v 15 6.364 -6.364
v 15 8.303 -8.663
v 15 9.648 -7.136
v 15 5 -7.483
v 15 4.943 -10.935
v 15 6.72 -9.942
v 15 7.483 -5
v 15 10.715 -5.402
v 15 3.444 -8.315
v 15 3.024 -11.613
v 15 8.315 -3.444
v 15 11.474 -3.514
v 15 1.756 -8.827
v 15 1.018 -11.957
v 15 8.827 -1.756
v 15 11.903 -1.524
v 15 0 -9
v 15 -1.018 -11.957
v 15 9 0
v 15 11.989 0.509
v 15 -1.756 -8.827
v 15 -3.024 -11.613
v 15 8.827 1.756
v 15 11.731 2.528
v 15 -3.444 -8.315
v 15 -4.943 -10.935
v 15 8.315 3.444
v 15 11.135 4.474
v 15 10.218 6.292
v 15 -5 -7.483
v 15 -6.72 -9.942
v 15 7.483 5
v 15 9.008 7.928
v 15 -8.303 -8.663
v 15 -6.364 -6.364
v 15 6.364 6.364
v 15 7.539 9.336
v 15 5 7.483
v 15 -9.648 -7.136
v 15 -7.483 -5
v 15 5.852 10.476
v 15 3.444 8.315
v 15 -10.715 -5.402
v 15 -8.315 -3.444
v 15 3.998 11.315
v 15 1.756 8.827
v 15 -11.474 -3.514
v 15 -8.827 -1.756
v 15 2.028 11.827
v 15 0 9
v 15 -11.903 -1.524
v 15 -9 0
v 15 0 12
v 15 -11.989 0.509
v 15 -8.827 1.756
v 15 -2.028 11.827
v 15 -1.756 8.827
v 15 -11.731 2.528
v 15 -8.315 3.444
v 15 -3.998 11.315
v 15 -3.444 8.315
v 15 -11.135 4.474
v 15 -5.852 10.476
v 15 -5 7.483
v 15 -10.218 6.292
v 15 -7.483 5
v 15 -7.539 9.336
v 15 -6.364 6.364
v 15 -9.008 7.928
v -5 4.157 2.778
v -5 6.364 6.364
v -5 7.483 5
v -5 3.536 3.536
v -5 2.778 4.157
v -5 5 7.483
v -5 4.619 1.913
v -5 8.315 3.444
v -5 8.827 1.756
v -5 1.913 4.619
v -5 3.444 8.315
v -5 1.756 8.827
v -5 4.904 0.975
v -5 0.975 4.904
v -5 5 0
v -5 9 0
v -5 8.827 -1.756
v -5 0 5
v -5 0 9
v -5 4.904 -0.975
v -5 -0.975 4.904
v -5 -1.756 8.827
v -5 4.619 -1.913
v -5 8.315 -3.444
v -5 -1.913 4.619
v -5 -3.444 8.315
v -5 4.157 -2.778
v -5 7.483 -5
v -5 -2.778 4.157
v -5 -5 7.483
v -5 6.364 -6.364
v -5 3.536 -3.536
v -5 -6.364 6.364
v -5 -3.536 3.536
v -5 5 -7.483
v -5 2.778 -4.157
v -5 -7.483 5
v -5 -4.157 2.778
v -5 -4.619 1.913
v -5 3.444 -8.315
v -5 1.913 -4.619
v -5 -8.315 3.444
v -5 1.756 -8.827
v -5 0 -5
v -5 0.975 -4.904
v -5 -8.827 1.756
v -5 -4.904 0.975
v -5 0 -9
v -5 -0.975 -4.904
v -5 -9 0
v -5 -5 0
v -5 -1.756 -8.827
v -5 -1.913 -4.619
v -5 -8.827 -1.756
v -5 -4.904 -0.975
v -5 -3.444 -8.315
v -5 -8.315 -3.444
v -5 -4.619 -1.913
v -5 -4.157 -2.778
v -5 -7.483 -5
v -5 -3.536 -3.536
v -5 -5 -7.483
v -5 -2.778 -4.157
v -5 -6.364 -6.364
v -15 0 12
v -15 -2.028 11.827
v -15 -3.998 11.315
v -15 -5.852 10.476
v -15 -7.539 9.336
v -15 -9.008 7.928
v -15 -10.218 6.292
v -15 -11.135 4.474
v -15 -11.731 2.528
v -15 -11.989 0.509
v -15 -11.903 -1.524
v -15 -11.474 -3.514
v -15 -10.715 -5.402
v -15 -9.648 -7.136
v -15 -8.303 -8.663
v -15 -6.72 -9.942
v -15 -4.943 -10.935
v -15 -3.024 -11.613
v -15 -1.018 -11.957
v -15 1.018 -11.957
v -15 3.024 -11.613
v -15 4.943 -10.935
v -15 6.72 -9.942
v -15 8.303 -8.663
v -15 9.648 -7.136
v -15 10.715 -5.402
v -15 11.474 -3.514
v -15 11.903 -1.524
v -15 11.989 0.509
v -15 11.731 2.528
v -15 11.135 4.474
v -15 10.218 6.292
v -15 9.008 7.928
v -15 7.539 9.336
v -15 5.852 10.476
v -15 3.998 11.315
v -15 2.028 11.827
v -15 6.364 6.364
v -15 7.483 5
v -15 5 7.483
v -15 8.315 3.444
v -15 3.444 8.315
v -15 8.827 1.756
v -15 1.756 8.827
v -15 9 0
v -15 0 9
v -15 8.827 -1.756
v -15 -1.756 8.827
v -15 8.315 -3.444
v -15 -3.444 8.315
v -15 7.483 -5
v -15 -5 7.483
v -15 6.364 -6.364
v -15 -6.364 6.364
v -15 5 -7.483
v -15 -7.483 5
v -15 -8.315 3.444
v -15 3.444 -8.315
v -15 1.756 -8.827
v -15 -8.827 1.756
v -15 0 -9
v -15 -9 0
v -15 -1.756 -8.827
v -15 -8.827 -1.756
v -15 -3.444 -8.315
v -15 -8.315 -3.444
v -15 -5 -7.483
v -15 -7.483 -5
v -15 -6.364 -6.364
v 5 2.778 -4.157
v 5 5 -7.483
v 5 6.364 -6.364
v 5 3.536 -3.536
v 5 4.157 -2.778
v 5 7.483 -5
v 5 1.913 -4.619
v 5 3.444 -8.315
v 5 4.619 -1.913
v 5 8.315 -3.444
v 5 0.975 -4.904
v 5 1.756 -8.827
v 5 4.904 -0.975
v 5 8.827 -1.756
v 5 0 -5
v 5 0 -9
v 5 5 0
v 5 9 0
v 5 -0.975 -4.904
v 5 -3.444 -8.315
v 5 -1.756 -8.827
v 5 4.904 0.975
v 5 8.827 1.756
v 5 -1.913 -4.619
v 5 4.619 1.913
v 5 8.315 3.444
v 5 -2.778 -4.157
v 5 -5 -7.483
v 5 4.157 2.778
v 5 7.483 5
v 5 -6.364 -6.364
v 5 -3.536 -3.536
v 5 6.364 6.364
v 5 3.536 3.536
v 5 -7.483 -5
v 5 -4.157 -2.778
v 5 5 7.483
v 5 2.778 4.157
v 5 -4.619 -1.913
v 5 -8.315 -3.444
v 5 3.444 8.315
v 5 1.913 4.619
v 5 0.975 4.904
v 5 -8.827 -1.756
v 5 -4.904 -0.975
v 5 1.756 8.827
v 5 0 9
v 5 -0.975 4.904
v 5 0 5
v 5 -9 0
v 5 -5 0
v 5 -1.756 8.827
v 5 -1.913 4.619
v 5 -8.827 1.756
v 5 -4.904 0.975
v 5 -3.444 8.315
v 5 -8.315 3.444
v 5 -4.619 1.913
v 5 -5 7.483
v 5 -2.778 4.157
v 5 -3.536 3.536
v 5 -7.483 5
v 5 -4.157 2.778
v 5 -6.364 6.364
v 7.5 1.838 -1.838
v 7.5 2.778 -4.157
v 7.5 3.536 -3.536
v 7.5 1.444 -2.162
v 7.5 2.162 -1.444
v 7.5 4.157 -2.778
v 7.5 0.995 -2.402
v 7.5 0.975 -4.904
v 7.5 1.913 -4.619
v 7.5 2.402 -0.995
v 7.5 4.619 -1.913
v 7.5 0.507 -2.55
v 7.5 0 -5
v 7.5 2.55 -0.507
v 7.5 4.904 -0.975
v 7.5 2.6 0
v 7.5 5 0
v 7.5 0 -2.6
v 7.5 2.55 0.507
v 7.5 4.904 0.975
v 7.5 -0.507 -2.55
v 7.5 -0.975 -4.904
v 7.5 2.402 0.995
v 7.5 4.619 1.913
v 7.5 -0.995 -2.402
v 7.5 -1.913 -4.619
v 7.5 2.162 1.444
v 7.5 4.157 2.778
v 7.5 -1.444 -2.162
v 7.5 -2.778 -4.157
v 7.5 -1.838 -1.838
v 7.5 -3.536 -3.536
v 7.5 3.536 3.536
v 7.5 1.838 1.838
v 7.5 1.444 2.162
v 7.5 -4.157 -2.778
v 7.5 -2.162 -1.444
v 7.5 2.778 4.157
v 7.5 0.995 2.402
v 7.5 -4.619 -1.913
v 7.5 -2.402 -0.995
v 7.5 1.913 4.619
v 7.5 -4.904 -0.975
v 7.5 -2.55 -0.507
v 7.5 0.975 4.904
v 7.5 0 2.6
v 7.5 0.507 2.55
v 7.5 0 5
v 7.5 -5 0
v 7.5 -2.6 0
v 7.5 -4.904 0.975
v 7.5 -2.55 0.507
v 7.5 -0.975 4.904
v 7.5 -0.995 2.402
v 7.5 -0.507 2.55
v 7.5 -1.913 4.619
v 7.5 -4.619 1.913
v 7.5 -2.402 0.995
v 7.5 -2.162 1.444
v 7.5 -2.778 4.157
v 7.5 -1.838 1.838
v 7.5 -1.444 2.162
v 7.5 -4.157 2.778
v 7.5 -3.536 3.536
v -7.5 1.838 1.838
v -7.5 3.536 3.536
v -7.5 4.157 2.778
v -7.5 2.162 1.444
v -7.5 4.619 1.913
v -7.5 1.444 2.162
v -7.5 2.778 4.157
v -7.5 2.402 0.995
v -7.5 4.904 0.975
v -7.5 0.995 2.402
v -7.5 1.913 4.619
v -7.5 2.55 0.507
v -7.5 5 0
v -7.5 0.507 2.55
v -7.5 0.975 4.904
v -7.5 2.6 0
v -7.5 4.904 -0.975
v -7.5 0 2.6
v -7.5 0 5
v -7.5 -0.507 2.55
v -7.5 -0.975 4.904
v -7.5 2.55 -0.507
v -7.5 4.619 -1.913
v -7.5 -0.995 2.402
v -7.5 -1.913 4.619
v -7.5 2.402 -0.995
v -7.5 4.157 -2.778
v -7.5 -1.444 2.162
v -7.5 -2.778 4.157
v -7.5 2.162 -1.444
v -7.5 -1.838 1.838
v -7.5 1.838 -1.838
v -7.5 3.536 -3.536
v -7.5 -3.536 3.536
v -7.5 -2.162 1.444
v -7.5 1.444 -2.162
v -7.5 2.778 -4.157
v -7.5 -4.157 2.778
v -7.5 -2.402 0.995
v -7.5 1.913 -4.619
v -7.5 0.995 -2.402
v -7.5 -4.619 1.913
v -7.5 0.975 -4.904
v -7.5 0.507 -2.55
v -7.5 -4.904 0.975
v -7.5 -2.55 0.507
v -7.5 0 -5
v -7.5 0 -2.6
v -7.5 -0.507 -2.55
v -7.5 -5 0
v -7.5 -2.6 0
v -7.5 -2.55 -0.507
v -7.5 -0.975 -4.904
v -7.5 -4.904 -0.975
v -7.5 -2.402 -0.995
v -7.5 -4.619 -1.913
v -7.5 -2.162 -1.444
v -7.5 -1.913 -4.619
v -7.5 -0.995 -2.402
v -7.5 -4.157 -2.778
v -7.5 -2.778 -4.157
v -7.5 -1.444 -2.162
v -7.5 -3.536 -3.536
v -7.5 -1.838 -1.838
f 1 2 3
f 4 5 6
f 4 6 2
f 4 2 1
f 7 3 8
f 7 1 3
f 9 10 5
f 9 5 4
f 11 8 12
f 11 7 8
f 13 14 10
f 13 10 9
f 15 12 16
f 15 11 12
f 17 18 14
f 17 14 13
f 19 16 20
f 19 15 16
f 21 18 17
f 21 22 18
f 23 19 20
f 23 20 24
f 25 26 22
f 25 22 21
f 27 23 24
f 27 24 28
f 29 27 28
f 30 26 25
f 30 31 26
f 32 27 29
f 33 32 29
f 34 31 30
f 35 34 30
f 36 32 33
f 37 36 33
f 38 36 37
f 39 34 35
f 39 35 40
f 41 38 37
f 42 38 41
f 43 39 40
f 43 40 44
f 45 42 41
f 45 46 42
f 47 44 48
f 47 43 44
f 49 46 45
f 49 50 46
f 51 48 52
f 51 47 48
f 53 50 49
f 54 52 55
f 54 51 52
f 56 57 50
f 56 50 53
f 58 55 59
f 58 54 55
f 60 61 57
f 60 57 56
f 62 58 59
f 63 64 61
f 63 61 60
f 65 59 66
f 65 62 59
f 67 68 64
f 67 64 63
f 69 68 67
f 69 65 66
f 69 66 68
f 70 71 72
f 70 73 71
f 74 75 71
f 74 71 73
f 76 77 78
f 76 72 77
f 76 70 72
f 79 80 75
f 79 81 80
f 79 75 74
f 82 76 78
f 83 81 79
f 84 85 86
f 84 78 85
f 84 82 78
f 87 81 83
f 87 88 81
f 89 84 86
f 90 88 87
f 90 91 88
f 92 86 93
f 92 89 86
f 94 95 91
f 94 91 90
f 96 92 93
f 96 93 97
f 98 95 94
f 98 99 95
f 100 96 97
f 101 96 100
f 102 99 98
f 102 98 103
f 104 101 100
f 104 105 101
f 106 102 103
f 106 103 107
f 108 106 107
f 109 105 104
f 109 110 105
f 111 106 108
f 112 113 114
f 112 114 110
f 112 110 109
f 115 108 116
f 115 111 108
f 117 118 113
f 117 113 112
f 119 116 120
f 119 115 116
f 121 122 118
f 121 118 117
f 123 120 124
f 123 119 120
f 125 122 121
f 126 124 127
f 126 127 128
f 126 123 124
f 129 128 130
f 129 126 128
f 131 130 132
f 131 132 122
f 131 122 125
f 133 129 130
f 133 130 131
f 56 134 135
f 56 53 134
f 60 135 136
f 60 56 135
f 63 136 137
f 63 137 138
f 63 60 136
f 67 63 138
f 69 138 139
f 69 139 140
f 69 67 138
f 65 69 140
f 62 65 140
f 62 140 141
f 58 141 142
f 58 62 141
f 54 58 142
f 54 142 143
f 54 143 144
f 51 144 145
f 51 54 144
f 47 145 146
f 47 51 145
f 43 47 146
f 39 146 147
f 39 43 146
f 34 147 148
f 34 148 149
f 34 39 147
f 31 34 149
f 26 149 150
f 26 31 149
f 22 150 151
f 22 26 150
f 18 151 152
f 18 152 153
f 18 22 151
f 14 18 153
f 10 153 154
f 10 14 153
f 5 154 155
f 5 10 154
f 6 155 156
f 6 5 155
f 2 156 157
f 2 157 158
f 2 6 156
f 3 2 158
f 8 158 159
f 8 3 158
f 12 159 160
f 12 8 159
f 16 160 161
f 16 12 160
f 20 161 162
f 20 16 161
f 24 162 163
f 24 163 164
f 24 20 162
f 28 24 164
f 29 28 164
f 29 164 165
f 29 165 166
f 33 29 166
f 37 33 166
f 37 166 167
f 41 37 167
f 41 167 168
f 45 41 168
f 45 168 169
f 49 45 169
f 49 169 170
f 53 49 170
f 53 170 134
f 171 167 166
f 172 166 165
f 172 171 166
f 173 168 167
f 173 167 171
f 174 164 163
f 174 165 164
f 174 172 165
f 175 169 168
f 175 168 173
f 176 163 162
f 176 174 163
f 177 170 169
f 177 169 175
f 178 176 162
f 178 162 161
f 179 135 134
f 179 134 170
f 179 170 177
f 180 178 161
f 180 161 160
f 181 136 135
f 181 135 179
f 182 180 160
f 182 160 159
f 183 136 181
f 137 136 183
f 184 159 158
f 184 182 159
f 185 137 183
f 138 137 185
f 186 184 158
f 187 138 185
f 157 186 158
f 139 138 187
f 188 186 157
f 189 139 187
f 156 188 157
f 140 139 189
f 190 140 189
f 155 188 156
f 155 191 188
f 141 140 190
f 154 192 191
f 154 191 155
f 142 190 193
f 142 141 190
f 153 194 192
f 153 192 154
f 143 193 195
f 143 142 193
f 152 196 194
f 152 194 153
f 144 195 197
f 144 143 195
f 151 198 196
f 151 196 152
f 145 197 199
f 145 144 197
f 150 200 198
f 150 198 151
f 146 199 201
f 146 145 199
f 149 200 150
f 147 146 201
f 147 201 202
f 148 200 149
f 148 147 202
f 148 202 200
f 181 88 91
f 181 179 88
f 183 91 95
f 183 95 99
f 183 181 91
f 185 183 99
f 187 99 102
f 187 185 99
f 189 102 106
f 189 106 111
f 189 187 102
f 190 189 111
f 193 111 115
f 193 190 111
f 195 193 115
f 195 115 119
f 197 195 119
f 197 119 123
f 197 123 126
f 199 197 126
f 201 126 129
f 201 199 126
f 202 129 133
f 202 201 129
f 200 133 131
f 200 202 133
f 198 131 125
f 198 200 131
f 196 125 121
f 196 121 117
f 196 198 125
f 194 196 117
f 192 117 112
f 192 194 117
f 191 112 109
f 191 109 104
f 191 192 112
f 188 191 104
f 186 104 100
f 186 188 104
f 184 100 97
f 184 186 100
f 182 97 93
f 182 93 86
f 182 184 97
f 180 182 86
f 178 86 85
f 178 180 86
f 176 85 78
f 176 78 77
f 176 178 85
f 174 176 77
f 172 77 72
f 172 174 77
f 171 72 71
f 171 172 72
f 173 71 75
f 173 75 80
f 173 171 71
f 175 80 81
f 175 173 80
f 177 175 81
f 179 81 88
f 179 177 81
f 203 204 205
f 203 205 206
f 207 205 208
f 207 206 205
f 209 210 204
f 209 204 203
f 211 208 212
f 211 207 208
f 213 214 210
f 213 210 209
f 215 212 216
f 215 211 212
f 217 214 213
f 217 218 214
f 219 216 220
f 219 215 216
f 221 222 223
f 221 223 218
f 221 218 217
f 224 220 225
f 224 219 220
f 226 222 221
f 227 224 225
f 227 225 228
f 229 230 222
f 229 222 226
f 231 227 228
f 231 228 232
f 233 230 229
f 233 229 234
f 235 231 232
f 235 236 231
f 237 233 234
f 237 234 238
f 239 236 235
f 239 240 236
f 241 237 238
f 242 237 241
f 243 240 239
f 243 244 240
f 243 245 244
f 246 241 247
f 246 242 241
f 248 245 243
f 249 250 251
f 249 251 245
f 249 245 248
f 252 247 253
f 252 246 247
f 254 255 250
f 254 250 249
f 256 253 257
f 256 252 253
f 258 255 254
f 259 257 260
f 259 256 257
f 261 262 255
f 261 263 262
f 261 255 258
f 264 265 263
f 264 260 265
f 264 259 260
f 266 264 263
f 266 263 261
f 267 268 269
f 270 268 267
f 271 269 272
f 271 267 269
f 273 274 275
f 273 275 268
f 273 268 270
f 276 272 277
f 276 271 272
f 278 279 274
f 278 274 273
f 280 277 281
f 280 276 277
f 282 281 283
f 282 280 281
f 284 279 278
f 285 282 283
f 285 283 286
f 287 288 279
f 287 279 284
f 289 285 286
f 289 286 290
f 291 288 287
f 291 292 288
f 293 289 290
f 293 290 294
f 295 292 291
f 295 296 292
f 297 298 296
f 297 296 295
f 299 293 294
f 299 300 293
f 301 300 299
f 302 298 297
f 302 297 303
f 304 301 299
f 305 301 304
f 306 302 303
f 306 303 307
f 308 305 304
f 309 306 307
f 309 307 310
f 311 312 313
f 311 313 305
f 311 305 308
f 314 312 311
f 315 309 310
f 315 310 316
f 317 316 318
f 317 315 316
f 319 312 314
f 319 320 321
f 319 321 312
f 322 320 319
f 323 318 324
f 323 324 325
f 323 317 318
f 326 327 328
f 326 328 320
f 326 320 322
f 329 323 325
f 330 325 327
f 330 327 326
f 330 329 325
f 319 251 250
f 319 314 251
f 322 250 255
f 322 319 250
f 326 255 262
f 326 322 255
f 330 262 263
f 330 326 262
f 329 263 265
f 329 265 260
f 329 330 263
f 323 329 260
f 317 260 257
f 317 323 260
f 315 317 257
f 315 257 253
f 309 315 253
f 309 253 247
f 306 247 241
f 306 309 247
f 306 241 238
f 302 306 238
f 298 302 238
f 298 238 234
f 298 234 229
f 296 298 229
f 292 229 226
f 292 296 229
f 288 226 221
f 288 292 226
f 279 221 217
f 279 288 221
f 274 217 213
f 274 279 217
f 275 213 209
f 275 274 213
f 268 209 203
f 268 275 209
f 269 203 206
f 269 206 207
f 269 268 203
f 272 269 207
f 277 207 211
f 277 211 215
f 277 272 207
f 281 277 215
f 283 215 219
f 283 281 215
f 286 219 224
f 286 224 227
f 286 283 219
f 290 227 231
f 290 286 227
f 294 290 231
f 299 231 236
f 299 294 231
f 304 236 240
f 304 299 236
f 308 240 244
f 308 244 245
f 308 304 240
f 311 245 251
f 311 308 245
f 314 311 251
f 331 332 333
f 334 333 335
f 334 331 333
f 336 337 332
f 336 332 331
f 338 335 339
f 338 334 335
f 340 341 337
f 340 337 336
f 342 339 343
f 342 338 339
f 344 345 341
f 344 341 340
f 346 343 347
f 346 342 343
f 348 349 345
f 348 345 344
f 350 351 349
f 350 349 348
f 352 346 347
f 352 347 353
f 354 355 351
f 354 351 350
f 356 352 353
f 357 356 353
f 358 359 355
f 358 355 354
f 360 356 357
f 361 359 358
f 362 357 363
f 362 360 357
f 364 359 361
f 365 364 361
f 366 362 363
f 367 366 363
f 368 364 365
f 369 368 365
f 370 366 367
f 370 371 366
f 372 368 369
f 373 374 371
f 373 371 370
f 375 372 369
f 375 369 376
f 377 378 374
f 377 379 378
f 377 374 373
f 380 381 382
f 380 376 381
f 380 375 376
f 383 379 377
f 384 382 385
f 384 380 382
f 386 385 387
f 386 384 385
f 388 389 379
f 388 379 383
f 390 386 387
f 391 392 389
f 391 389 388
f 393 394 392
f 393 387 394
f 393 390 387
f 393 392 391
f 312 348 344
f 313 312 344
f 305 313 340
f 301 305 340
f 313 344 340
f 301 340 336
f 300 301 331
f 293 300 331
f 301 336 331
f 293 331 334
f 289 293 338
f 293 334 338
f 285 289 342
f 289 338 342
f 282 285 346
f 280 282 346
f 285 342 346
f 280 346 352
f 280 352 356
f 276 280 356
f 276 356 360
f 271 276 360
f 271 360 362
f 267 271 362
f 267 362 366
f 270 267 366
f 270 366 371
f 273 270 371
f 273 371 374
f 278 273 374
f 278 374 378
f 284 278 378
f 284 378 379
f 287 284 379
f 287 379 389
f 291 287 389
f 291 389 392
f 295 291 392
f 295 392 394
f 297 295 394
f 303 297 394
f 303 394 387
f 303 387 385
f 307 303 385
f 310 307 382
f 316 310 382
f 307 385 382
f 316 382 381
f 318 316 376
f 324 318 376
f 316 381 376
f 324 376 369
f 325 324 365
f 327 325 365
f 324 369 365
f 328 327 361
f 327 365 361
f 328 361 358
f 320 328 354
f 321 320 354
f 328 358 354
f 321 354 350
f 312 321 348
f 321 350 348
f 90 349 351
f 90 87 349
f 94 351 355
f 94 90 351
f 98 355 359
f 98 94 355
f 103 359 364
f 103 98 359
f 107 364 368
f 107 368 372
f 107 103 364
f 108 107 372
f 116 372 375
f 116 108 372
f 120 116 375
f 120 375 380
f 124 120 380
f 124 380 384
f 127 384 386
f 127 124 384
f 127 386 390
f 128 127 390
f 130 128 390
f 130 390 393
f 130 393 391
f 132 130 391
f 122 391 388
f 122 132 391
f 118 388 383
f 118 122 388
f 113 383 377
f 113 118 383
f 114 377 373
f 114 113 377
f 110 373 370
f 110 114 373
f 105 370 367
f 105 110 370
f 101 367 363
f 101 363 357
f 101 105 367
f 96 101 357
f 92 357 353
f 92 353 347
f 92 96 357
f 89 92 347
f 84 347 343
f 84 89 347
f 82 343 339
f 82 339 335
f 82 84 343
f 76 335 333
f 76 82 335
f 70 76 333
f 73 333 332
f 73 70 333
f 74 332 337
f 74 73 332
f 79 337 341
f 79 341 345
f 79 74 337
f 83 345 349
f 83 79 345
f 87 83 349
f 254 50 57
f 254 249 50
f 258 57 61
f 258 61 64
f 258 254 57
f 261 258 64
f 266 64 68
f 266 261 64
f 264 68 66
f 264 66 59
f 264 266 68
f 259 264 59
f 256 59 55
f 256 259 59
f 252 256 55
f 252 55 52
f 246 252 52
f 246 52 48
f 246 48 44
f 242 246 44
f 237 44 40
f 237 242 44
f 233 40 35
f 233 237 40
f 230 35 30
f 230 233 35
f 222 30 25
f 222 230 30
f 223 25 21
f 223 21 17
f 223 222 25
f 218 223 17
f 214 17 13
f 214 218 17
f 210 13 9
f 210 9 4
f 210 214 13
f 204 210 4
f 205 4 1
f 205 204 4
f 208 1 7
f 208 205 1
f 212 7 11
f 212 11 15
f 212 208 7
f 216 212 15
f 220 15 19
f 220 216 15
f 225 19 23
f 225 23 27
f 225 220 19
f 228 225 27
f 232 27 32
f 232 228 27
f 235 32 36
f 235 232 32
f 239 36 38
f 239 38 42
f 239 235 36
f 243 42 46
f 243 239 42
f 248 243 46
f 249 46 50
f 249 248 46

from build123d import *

# Parameters (mm, degrees)
SKETCH2_R          = 2.6
CUT_EXTRUDE1_DEPTH = 29.182441342


with BuildPart() as part:
    # Sketch1 → Revolve1 (revolve)
    with BuildSketch(Plane.XY, mode=Mode.PRIVATE) as revolve1_sk:
        Polygon((-7.5, 0), (-7.5, 5), (-5, 5), (-5, 9), (-15, 9), (-15, 12), (15, 12), (15, 9), (5, 9), (5, 5), (7.5, 5), (7.5, 0), align=None)
    revolve(revolve1_sk.sketch.rotate(Axis((0, 0, 0), (1, 0, 0)), 90), axis=Axis((0, 0, 0), (1, 0, 0)))

    # Sketch2 → Cut-Extrude1 (cut, through all)
    with BuildSketch(Plane.ZY.offset(7.5)):
        Circle(SKETCH2_R)
    extrude(amount=-CUT_EXTRUDE1_DEPTH, mode=Mode.SUBTRACT)


solid = part.part
